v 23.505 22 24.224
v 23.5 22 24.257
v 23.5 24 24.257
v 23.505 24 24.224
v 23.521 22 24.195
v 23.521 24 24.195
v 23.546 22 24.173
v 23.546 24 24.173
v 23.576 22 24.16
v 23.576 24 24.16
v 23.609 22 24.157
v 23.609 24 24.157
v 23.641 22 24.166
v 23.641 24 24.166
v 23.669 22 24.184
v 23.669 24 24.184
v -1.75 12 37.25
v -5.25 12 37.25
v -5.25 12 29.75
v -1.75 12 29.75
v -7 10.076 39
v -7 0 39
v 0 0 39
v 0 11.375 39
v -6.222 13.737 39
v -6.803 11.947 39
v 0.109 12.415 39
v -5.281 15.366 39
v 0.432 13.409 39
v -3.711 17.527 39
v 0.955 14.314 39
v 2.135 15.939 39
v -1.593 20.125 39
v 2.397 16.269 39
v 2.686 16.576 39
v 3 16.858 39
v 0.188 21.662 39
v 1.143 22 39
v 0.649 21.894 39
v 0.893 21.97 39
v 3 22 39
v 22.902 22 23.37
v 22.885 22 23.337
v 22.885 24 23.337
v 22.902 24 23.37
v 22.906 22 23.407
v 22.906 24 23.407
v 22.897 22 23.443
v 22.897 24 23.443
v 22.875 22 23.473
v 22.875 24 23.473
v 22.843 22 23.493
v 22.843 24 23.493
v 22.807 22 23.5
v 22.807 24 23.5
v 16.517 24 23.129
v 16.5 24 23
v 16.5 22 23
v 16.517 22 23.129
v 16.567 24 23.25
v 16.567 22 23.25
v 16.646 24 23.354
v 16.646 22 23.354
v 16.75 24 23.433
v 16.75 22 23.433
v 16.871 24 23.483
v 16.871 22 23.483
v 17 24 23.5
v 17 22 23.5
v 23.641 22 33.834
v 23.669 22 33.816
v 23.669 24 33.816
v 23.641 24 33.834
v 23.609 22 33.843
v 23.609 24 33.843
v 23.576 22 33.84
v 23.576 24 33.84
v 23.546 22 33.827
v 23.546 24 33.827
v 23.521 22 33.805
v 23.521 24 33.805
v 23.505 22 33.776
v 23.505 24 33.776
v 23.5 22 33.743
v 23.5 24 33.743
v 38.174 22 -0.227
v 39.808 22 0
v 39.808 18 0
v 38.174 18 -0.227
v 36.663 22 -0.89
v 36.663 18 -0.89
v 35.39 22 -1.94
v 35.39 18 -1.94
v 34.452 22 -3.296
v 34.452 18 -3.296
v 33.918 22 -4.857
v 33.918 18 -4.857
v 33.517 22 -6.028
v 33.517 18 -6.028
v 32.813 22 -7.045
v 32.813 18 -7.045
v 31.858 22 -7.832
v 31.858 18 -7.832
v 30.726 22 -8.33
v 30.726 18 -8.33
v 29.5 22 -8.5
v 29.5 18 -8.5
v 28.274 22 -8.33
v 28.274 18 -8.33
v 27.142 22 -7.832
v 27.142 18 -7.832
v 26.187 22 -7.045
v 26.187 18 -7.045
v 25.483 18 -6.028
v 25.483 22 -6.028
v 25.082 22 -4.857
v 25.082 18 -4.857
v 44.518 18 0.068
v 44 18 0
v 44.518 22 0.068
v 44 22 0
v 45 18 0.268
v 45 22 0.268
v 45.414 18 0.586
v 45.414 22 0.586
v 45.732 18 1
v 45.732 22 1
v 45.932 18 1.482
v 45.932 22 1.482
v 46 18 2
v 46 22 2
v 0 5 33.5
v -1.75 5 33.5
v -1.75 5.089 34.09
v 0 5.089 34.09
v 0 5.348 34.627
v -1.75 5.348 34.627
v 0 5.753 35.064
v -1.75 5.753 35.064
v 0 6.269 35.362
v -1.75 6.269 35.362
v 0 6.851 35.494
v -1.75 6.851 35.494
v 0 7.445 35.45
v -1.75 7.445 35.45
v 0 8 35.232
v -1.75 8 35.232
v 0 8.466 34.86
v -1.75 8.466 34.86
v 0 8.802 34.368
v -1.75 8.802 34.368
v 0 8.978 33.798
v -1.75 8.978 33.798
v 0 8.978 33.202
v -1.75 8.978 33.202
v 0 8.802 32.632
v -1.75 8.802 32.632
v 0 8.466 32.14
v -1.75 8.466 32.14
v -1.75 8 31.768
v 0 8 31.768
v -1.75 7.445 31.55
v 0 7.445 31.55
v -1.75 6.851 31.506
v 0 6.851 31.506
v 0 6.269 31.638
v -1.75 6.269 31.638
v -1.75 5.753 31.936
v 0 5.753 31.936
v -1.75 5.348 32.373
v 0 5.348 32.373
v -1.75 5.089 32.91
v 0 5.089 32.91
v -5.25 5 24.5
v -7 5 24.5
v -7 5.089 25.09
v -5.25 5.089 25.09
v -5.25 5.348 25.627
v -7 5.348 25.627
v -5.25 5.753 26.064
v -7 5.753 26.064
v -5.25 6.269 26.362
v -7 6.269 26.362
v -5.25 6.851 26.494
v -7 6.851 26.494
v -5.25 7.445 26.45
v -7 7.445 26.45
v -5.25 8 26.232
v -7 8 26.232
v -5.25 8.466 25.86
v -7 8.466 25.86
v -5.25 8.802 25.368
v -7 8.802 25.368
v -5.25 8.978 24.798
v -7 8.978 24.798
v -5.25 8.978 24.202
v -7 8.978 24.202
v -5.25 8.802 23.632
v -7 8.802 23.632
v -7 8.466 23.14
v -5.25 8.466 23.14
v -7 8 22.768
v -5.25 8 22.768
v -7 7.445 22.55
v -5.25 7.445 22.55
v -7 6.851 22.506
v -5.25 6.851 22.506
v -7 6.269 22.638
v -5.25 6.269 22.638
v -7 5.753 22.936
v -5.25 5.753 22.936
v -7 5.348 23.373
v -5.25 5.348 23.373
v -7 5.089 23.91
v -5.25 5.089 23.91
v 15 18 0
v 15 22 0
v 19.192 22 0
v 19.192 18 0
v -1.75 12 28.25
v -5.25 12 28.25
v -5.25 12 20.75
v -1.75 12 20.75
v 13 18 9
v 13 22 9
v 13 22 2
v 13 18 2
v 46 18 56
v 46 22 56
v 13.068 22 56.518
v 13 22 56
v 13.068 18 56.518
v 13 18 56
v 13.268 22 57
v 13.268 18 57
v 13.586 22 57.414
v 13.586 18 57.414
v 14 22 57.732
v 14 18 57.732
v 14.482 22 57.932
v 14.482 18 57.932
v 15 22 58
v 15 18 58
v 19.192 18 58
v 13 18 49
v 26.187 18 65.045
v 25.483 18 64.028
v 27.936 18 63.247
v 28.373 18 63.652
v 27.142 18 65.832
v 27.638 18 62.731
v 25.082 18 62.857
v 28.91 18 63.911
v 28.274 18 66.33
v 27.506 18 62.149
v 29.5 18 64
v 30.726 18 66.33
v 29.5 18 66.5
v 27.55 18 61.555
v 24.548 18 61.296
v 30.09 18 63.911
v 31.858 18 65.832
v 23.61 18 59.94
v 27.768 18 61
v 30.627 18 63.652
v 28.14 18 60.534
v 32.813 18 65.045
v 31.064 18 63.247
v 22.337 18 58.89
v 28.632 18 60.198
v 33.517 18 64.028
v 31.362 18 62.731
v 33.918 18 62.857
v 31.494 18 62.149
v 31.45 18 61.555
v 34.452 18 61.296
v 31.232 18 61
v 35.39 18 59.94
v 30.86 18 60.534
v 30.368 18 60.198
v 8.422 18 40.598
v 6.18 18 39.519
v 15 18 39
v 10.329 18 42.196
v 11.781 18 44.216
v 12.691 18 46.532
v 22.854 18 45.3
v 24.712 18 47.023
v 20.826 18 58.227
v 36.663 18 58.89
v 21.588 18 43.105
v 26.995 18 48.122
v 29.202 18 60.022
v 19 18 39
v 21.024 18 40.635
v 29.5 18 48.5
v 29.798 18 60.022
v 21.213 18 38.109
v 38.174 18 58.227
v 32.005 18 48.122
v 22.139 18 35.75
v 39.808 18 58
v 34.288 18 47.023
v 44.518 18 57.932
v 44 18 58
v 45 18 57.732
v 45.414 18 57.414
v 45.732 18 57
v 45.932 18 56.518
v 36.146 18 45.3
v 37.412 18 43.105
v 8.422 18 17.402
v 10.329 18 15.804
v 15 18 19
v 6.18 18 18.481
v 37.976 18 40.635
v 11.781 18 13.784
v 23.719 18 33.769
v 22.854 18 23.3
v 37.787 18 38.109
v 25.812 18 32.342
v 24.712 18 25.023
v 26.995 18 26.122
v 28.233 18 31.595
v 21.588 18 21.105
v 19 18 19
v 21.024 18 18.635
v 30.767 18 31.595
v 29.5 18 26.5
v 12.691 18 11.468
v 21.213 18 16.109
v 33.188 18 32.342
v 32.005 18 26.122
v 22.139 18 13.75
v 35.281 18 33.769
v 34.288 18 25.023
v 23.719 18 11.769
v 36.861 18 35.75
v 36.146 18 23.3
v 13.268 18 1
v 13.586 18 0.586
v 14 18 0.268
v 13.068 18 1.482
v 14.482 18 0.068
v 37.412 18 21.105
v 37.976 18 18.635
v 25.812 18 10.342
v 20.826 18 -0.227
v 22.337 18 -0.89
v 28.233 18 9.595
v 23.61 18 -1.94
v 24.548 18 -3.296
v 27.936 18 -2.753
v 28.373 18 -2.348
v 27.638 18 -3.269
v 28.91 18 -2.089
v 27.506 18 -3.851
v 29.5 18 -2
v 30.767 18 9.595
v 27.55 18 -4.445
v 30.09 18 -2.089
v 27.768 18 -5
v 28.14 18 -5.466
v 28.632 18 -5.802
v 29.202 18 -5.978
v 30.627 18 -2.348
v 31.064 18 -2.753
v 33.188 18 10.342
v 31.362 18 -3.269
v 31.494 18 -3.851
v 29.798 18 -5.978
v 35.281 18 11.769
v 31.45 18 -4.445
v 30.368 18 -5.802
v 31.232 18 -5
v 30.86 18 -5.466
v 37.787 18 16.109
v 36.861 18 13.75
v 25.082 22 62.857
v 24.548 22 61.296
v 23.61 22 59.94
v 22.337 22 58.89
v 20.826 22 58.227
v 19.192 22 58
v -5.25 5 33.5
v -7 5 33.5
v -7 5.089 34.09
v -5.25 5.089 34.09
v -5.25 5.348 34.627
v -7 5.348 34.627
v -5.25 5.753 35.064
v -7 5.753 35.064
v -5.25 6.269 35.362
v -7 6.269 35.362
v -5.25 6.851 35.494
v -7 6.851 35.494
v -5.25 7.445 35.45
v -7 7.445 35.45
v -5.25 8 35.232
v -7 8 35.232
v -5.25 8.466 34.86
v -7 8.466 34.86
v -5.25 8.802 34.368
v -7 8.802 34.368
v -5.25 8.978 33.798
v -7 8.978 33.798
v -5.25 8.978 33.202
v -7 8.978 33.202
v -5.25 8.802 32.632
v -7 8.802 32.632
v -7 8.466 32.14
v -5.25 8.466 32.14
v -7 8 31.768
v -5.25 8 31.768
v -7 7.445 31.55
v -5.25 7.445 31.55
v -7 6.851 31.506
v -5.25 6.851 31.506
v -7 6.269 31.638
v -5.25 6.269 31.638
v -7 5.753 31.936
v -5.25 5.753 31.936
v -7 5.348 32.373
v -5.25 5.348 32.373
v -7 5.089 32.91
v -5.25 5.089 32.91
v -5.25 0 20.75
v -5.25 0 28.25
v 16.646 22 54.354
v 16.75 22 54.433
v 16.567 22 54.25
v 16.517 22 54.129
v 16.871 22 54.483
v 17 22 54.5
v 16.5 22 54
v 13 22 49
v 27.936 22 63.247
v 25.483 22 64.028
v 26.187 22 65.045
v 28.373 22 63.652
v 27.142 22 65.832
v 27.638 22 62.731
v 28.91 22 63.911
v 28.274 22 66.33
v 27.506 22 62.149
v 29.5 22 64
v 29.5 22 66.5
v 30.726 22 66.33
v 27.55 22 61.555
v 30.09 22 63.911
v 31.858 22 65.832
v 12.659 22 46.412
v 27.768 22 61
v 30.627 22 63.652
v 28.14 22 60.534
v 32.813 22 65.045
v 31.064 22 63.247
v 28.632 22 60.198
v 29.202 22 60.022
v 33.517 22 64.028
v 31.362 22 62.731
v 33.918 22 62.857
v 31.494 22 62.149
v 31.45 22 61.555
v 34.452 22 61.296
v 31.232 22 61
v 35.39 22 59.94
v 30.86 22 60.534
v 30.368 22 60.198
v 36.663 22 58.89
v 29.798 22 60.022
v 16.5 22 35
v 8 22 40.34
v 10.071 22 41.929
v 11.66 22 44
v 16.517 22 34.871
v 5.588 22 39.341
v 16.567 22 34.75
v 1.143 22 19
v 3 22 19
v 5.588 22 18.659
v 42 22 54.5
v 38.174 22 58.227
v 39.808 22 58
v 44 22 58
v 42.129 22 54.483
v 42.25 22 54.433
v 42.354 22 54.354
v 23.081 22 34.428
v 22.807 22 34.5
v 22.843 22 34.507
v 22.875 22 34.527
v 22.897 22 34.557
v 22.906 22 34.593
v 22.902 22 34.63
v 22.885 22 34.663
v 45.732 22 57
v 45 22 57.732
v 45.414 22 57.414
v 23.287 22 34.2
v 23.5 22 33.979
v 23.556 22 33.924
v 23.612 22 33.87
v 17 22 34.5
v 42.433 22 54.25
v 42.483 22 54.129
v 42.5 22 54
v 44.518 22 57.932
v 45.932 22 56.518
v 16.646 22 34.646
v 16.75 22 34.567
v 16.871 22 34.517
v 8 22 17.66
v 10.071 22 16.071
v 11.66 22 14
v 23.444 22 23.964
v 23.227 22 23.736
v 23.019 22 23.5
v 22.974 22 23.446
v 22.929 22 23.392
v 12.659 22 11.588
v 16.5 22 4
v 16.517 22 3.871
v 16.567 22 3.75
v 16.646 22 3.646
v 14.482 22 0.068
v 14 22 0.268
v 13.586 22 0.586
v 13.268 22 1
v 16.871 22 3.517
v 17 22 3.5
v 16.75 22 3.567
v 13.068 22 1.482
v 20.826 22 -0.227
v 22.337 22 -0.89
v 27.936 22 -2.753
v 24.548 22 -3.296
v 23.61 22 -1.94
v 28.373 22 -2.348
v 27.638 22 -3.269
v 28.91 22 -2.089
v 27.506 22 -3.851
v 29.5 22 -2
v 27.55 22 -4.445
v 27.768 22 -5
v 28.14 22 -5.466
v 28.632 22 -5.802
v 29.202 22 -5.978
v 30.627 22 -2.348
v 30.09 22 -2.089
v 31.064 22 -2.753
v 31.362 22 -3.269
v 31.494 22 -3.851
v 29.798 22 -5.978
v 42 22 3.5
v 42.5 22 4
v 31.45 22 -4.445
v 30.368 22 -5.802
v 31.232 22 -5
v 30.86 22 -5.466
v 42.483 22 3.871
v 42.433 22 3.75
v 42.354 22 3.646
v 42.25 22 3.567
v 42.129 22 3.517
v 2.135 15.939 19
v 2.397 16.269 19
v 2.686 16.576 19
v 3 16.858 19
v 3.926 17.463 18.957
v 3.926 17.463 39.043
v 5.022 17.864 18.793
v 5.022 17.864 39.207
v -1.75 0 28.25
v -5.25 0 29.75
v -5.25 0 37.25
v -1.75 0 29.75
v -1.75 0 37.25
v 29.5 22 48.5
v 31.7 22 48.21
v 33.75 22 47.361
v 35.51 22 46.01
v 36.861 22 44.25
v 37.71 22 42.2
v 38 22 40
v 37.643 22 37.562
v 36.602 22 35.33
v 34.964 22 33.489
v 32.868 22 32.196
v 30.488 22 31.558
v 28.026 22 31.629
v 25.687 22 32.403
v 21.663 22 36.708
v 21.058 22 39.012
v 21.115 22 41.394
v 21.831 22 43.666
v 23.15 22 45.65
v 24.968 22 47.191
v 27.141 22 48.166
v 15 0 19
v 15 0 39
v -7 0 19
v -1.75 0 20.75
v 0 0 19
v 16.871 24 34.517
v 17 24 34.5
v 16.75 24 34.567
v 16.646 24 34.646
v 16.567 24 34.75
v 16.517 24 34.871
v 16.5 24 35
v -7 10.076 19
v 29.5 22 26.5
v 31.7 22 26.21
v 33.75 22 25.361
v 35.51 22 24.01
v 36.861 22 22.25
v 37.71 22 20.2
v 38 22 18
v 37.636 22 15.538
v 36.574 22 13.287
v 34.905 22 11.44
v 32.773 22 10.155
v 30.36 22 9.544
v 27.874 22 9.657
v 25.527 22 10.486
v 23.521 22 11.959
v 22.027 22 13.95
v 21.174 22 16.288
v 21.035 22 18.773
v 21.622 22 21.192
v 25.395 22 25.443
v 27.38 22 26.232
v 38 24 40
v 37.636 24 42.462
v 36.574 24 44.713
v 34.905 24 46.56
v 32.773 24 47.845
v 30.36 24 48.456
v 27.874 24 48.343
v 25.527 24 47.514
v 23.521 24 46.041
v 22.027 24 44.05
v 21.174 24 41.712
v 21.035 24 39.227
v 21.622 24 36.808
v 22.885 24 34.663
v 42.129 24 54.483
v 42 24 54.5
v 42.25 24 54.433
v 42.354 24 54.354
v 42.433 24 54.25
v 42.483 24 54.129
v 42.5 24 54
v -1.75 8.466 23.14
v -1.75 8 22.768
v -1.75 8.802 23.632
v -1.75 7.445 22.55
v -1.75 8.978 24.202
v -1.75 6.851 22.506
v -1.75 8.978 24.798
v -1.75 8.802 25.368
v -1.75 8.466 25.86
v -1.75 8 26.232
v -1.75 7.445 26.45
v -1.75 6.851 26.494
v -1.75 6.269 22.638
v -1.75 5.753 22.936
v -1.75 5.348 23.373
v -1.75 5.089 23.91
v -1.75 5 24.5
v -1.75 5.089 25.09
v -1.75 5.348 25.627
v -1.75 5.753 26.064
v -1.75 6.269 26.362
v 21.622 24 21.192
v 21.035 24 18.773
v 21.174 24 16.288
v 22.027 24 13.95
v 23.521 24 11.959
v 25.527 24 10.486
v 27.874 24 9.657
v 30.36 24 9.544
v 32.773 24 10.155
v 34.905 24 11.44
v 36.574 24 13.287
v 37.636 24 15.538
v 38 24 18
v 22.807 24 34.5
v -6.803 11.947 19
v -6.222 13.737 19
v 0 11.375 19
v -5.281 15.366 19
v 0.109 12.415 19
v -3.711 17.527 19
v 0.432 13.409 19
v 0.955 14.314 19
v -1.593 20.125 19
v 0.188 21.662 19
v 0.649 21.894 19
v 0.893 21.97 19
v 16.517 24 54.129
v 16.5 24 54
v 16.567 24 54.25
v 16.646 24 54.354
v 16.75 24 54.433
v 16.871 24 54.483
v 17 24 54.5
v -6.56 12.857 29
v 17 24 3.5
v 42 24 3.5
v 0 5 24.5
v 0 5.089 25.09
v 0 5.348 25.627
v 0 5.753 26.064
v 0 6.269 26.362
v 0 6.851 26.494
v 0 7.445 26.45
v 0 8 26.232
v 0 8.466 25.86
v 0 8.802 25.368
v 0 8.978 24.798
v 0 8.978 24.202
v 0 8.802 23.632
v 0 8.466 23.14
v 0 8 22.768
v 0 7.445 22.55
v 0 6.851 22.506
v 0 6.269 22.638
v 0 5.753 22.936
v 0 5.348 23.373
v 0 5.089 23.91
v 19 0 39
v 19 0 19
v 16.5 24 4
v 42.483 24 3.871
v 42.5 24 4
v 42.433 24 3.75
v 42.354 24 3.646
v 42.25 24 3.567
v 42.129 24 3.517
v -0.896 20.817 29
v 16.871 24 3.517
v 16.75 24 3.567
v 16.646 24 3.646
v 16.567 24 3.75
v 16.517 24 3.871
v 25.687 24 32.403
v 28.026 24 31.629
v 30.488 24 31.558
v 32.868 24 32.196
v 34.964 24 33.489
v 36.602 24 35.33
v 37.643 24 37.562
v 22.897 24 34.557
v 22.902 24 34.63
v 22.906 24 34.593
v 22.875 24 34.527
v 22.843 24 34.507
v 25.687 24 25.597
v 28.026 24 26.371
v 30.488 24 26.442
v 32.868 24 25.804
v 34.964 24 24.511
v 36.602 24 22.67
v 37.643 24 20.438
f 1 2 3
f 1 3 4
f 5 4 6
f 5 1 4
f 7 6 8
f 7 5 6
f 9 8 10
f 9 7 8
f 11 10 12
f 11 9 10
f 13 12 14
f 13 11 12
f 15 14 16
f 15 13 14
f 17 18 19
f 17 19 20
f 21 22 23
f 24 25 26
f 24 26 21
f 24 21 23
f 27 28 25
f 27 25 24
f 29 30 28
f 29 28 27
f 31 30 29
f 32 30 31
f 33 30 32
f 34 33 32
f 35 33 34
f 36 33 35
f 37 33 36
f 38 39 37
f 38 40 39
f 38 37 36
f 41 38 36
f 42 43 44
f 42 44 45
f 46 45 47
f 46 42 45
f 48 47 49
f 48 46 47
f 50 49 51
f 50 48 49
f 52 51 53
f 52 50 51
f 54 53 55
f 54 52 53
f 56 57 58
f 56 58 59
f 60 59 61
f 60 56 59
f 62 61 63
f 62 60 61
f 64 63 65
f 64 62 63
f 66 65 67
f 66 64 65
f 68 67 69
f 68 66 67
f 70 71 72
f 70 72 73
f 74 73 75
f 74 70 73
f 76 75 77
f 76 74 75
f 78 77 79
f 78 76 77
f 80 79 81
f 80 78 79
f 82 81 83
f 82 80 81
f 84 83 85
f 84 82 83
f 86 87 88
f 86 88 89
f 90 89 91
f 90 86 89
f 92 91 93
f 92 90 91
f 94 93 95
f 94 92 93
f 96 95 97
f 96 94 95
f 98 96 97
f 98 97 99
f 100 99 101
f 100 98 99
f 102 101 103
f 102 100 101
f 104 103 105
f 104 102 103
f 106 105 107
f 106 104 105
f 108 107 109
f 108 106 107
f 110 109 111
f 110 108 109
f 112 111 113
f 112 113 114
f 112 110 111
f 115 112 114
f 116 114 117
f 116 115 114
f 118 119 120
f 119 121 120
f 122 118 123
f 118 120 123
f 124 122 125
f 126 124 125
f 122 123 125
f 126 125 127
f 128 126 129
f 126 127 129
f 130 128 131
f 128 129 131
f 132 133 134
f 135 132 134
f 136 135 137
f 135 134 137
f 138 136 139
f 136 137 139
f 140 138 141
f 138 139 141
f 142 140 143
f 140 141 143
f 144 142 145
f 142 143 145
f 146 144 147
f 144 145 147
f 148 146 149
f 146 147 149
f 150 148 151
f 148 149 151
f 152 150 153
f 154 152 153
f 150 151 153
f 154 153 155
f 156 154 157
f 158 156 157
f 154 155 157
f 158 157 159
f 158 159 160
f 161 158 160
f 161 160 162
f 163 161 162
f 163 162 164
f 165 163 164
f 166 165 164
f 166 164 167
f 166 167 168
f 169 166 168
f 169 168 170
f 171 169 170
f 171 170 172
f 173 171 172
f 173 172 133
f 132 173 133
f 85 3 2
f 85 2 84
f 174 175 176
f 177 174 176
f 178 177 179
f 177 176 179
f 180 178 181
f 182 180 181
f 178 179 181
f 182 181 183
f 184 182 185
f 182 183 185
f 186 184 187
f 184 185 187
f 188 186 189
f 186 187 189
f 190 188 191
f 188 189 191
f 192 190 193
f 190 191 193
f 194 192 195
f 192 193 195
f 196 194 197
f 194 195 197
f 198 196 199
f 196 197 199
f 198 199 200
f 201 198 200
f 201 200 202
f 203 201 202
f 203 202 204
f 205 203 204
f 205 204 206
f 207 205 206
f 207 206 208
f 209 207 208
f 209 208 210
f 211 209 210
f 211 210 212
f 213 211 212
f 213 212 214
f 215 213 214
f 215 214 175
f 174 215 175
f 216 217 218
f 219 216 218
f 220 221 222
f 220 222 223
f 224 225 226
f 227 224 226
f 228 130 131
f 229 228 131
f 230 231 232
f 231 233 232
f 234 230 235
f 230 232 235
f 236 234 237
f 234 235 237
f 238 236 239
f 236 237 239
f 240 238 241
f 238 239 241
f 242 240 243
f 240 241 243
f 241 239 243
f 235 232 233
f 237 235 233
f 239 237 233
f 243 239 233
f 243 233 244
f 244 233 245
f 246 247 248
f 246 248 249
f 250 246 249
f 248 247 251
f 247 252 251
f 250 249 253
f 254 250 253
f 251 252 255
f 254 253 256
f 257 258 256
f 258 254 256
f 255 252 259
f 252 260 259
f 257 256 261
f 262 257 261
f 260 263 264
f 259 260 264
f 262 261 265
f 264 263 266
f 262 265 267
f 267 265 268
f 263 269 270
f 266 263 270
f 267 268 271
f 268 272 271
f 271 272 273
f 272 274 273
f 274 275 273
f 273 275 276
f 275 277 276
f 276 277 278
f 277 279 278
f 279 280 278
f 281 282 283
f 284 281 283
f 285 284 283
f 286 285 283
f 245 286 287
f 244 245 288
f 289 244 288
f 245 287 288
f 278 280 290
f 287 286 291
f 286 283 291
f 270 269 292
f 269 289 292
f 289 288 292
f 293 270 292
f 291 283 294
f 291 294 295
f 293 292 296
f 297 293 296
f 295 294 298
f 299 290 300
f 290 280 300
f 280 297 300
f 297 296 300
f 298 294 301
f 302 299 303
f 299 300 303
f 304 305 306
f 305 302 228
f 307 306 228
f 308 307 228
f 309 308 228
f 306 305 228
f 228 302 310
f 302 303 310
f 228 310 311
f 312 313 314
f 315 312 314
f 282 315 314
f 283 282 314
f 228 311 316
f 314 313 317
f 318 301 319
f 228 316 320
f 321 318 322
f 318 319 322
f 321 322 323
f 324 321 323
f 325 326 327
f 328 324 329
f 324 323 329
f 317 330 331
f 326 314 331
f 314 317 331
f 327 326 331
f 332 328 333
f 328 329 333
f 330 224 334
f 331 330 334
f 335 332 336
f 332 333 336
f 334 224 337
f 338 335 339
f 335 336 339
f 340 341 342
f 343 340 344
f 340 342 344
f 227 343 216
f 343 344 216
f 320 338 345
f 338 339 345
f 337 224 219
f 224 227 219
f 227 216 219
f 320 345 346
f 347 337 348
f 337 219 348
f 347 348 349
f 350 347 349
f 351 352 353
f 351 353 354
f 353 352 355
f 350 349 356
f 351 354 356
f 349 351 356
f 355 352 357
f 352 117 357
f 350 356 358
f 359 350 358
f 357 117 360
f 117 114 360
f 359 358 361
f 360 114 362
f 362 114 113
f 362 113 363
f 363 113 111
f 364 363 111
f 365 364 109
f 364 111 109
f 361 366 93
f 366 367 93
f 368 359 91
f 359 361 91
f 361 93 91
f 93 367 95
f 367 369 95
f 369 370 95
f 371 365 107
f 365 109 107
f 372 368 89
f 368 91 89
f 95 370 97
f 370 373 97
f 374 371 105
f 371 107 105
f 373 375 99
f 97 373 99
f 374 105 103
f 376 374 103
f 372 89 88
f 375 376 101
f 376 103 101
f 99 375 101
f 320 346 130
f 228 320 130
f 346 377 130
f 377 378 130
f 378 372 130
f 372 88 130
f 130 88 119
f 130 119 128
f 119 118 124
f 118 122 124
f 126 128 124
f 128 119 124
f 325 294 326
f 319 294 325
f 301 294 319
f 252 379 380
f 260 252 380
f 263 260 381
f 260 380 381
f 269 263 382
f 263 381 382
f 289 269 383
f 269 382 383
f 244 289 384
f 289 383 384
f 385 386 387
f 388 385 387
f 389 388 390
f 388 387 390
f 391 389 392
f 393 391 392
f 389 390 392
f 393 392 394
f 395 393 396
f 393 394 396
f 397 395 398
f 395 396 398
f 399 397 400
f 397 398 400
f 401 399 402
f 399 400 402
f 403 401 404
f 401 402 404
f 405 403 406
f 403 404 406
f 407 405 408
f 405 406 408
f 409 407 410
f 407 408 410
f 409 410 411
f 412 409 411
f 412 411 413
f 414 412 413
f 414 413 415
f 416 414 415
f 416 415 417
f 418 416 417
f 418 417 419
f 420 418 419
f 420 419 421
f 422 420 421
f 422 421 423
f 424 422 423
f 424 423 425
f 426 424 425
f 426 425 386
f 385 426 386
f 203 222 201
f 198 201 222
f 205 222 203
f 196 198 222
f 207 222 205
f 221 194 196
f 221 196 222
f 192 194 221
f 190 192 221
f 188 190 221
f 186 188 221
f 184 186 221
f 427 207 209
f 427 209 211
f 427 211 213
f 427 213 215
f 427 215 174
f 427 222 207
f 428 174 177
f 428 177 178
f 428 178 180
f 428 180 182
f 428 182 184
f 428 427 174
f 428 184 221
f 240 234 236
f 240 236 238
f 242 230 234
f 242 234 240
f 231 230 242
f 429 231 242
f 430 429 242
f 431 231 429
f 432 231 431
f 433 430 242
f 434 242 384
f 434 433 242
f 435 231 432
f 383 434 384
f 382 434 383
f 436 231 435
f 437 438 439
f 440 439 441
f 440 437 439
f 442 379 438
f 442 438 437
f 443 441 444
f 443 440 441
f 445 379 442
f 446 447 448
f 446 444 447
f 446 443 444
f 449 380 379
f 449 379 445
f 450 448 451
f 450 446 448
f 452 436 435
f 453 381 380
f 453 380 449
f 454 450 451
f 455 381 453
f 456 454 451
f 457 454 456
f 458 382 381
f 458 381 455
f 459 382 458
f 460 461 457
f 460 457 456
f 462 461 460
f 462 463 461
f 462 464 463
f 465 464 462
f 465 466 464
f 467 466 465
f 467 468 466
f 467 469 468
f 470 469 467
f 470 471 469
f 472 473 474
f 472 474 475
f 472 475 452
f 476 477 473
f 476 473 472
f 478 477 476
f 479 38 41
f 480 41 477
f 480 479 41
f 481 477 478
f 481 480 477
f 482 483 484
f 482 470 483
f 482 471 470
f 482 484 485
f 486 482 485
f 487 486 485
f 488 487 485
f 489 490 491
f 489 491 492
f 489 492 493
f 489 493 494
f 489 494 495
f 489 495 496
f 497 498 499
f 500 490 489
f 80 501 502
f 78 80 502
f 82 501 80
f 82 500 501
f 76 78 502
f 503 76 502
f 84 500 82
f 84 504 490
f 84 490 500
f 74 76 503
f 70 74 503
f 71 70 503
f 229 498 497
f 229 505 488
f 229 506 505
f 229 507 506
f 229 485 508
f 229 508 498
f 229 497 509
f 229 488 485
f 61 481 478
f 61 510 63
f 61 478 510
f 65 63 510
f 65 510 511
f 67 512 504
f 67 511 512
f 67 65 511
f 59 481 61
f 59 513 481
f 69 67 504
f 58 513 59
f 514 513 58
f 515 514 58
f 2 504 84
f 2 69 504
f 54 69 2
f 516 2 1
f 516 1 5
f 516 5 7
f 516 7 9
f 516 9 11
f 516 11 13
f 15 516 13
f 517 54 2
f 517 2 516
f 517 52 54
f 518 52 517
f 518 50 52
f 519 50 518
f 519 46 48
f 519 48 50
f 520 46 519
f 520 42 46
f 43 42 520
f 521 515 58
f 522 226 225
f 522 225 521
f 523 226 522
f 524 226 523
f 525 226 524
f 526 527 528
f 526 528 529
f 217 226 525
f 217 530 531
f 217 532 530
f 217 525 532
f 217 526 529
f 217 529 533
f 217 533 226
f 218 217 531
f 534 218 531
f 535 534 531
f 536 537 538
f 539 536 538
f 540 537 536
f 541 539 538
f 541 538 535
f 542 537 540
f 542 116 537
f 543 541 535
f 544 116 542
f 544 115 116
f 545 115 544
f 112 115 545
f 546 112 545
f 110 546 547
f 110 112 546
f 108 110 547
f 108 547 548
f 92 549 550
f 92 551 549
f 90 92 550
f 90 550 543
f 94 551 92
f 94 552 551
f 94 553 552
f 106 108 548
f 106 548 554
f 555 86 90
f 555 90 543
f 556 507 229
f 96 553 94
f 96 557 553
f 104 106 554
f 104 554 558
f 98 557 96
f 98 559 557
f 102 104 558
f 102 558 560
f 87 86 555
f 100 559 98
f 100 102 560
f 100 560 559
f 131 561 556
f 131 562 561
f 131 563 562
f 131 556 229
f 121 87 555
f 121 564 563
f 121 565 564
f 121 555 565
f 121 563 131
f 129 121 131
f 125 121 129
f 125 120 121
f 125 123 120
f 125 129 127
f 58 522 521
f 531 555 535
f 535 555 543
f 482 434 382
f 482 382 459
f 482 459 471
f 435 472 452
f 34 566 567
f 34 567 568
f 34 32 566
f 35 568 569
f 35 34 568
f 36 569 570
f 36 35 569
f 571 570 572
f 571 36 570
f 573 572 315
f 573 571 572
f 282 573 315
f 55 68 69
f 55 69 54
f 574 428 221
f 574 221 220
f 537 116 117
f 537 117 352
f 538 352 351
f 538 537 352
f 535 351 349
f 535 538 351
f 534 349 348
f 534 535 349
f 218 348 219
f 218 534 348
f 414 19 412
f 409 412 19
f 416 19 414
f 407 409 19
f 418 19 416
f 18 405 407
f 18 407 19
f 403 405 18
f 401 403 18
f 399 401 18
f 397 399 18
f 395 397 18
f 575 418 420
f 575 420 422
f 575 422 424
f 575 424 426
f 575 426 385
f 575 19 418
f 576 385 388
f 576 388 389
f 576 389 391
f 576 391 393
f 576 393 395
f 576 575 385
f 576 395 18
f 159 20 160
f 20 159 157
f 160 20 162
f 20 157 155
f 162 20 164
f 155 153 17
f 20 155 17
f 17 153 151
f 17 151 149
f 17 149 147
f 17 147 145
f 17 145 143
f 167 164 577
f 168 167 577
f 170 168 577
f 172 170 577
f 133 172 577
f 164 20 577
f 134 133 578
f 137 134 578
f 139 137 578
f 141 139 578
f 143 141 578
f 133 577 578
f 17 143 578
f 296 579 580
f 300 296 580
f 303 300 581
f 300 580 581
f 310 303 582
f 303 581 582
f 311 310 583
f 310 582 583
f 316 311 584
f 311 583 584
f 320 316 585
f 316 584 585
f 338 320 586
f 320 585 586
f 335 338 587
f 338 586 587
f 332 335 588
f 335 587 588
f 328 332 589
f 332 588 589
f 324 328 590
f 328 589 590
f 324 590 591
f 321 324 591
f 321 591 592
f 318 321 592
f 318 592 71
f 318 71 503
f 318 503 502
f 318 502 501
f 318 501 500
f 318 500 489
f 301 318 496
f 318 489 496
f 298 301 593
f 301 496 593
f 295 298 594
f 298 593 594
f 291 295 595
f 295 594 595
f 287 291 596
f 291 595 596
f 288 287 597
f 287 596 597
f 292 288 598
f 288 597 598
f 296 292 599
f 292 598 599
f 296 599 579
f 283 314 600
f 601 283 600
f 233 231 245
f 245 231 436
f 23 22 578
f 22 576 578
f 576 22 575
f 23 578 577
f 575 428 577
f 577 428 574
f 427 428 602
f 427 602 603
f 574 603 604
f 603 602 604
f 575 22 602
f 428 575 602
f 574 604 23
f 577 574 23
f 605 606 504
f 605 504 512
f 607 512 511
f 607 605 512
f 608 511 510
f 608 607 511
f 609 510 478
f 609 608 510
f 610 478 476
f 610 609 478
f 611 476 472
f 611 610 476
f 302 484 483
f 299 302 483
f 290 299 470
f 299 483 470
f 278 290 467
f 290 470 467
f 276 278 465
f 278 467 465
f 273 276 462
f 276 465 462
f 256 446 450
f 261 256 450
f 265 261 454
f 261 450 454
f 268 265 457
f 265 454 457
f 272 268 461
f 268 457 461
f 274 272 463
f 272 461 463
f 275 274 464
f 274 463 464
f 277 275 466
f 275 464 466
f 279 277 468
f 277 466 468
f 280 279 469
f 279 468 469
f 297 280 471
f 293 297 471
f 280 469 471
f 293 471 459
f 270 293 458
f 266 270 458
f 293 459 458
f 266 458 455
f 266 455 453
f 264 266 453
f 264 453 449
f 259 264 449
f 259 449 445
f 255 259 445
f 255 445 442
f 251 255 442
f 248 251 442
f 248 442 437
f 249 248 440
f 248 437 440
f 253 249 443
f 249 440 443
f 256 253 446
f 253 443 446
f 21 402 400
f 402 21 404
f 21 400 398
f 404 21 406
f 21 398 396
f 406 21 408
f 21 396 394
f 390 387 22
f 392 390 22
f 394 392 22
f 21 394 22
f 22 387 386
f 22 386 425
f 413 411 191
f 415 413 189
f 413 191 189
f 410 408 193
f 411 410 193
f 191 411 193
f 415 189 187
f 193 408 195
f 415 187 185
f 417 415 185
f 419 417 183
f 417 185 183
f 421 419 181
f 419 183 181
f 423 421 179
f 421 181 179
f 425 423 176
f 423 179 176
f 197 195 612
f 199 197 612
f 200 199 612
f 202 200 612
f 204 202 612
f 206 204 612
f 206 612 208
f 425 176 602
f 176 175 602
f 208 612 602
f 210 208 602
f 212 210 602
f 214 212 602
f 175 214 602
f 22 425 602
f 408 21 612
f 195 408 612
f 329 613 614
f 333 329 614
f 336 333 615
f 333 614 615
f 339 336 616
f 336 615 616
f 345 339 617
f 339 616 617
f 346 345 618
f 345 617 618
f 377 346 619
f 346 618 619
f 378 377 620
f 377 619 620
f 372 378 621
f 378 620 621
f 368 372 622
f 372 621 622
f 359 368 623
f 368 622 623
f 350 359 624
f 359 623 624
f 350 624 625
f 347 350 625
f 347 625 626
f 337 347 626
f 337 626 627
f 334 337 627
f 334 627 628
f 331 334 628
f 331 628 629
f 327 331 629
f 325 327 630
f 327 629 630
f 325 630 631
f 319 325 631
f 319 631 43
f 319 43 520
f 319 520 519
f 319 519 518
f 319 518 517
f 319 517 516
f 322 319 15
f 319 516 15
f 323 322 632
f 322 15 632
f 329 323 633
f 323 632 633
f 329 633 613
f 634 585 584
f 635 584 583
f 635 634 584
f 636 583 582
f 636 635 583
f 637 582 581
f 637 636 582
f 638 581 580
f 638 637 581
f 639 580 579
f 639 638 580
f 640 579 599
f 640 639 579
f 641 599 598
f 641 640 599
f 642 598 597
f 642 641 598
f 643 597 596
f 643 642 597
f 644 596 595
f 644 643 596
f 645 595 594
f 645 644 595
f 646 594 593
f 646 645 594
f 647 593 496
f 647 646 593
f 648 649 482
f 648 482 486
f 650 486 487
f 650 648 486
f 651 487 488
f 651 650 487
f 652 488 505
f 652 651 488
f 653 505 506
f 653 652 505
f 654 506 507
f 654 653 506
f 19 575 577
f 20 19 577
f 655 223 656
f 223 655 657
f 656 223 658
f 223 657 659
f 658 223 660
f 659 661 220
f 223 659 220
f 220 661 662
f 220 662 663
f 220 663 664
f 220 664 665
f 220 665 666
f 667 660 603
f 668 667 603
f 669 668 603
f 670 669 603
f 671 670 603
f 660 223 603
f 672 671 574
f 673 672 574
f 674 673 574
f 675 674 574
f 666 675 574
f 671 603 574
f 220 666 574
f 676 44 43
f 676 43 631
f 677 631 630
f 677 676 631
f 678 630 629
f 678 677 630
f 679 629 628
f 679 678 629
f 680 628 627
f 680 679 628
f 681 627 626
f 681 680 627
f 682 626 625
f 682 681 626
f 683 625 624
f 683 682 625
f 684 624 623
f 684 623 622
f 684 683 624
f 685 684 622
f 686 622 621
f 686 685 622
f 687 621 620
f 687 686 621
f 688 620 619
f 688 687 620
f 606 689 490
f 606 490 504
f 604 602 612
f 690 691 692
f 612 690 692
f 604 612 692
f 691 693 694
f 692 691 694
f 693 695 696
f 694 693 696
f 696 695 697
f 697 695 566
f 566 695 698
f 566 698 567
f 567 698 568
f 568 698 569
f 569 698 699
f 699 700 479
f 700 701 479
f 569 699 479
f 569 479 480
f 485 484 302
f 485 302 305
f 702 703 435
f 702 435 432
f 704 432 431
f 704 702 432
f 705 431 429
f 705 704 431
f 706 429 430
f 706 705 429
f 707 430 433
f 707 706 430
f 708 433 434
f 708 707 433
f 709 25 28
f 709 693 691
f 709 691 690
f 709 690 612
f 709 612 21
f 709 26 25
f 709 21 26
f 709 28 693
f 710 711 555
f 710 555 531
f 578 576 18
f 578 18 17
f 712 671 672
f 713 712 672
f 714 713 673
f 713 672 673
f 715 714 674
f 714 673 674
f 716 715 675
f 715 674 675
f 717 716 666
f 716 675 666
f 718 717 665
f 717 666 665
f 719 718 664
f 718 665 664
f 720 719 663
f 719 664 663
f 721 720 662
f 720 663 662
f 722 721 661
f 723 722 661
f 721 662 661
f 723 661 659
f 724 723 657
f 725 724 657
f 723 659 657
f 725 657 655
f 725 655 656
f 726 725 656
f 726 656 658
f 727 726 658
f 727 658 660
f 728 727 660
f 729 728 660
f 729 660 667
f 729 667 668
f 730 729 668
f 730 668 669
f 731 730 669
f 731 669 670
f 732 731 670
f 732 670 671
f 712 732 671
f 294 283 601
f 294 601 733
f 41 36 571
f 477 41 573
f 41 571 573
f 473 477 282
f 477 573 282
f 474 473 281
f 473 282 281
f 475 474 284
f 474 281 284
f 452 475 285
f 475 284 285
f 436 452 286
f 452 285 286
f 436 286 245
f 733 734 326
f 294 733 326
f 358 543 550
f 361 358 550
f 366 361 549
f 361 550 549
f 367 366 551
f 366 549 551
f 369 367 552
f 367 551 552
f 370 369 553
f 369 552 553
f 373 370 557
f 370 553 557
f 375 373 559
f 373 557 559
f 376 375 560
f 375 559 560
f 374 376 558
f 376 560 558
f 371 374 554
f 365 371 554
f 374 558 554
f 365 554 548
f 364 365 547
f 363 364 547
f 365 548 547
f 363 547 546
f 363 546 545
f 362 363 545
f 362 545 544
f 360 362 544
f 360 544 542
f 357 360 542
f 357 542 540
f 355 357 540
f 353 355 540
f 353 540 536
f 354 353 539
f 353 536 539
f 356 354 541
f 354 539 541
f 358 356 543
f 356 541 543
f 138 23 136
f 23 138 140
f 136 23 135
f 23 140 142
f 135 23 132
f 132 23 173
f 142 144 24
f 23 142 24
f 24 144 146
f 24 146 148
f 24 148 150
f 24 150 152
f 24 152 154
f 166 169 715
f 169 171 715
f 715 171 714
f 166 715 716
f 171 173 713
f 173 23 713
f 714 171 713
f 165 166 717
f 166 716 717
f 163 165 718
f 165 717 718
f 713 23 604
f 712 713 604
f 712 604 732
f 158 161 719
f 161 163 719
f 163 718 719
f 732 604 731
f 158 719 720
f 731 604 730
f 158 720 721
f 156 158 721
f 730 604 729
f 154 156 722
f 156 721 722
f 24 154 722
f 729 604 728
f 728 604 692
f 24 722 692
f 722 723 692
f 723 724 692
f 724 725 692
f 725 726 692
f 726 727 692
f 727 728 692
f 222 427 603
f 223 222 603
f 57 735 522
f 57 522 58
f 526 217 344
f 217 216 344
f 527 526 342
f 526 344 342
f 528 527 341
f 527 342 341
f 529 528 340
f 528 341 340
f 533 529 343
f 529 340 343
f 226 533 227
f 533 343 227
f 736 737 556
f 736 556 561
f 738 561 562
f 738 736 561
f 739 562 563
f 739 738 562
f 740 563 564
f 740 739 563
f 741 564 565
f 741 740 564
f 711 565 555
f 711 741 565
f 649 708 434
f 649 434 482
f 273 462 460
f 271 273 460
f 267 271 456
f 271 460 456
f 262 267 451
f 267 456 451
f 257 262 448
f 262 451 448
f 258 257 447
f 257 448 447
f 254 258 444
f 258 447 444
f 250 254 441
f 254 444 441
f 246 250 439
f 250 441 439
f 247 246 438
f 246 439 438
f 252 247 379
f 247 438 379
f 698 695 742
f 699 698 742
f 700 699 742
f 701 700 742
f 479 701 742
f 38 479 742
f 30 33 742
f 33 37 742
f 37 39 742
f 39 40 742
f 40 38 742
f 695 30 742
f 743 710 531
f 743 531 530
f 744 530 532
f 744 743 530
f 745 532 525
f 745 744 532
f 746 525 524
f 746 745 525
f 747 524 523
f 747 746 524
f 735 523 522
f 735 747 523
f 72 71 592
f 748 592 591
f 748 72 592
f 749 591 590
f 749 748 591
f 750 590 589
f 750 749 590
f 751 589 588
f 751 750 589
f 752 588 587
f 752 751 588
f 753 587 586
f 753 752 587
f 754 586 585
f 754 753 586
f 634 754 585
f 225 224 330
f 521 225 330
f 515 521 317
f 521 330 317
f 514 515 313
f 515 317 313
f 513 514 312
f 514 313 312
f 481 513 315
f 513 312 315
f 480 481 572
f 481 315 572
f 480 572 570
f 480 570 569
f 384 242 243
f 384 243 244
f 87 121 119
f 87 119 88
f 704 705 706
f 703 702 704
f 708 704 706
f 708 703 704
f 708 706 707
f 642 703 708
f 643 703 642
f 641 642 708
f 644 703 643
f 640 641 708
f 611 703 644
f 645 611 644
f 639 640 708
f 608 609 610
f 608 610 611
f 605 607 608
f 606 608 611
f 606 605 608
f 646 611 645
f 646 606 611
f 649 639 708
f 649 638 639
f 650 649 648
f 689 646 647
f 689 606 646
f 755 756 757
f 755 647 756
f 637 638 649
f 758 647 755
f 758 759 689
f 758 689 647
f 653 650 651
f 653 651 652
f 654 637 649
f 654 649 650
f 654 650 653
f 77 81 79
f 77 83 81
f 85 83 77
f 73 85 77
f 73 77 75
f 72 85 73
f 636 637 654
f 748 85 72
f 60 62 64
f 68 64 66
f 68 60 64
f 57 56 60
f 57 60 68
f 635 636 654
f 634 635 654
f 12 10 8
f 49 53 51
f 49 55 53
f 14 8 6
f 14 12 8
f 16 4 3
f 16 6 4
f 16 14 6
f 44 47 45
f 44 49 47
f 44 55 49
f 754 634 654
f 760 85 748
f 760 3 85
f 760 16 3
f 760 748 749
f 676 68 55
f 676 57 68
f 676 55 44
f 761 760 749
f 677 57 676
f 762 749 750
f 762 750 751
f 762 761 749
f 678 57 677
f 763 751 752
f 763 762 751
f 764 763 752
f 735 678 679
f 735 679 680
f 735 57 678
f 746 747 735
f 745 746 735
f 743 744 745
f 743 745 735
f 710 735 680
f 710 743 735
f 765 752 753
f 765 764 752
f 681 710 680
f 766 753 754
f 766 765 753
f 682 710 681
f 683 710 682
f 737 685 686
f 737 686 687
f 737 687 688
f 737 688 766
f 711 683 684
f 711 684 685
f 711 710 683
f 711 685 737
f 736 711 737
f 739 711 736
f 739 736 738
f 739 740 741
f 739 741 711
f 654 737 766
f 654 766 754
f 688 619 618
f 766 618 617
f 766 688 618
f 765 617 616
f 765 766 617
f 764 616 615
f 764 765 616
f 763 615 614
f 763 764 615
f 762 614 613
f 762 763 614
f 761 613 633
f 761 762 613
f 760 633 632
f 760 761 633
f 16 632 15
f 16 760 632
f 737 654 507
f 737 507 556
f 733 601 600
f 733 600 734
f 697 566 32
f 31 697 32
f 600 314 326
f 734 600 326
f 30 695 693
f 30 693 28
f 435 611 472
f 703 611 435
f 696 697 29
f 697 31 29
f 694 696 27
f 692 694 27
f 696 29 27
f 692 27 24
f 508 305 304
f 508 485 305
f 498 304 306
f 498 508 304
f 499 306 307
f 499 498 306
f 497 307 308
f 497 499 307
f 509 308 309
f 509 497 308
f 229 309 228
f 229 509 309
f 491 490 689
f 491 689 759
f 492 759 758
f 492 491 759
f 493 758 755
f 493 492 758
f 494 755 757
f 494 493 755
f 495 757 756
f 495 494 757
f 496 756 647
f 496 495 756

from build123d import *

# Parameters (mm, degrees)
BOSS_EXTRU_1_DEPTH      = 58
ESQUISSE16_R            = 2
BOSS_EXTRU_2_DEPTH      = 4
ESQUISSE9_R             = 2
ENL_V_MAT_EXTRU_5_DEPTH = 10
ESQUISSE14_W            = 20
ESQUISSE14_H            = 19
ENL_V_MAT_EXTRU_7_DEPTH = 84.798866341
ESQUISSE5_W             = 3.5
ESQUISSE5_H             = 7.5
ENL_V_MAT_EXTRU_3_DEPTH = 12
CONG_6_R                = 2
CONG_11_R               = 10
ESQUISSE15_W            = 72.69818271
ESQUISSE15_H            = 50
ENL_V_MAT_EXTRU_8_DEPTH = 18
ESQUISSE17_R            = 8.5
ENL_V_MAT_EXTRU_9_DEPTH = 10
CHANFREIN1_SIZE         = 9
CHANFREIN1_SIZE2        = 6.538882752
CHANFREIN2_SIZE         = 5
CHANFREIN2_SIZE2        = 3.63271264
CONG_14_R               = 5
CONG_16_START           = 18
CONG_16_DEPTH           = 22
BOSS_EXTRU_3_START      = 2
BOSS_EXTRU_3_DEPTH      = 2
CONG_17_START           = 22
CONG_17_DEPTH           = 3


with BuildPart() as part:
    # Esquisse1 → Boss.-Extru.1 (new body)
    with BuildSketch(Plane.XY):
        Polygon((0, 0), (0, 18), (15, 18), (15, 0), (19, 0), (19, 18), (46, 18), (46, 22), (-7, 22), (-7, 0), align=None)
    extrude(amount=BOSS_EXTRU_1_DEPTH)

    # Esquisse16 → Boss.-Extru.2 (add)
    # profile 1 of 2: a face of its own
    with BuildSketch(Plane(origin=(0, 22, 0), x_dir=(1, 0, 0), z_dir=(0, 1, 0))):
        with BuildLine():
            Line((17, -3), (42, -3))
            Line((42, -3), (42, 0))
            Line((42, 0), (39.807764064, 0))
            ThreePointArc((39.807764064, 0), (35.990510002, 1.370899501), (33.91761317, 4.857142857))
            ThreePointArc((33.91761317, 4.857142857), (29.5, 8.5), (25.08238683, 4.857142857))
            ThreePointArc((25.08238683, 4.857142857), (23.009489998, 1.370899501), (19.192235936, 0))
            Line((19.192235936, 0), (17, 0))
            Line((17, 0), (17, -3))
        make_face()
        with Locations(Location((29.5, 4, 0), (0, 0, 270))):
            Circle(ESQUISSE16_R, mode=Mode.SUBTRACT)
    # profile 2 of 2: a face of its own
    with BuildSketch(Plane(origin=(0, 22, 0), x_dir=(1, 0, 0), z_dir=(0, 1, 0))):
        with BuildLine():
            Line((17, -58), (17, -55))
            Line((17, -55), (42, -55))
            Line((42, -55), (42, -58))
            Line((42, -58), (39.807764064, -58))
            ThreePointArc((39.807764064, -58), (35.990510002, -59.370899501), (33.91761317, -62.857142857))
            ThreePointArc((33.91761317, -62.857142857), (29.5, -66.5), (25.08238683, -62.857142857))
            ThreePointArc((25.08238683, -62.857142857), (23.009489998, -59.370899501), (19.192235936, -58))
            Line((19.192235936, -58), (17, -58))
        make_face()
        with Locations(Location((29.5, -62, 0), (0, 0, 270))):
            Circle(ESQUISSE16_R, mode=Mode.SUBTRACT)
    extrude(amount=-BOSS_EXTRU_2_DEPTH)

    # Esquisse9 → Enlèv. mat.-Extru.5 (cut)
    with BuildSketch(Plane.ZY.offset(7)):
        with Locations(Location((33.5, 7, 0), (0, 0, 270))):
            Circle(ESQUISSE9_R)
        with Locations(Location((24.5, 7, 0), (0, 0, 270))):
            Circle(ESQUISSE9_R)
    extrude(amount=-ENL_V_MAT_EXTRU_5_DEPTH, mode=Mode.SUBTRACT)

    # Esquisse14 → Enlèv. mat.-Extru.7 (cut, through all)
    with BuildSketch(Plane(origin=(0, 22, 0), x_dir=(1, 0, 0), z_dir=(0, 1, 0))):
        with Locations((3, -9.5)):
            Rectangle(ESQUISSE14_W, ESQUISSE14_H)
        with Locations((3, -48.5)):
            Rectangle(ESQUISSE14_W, ESQUISSE14_H)
    extrude(amount=-ENL_V_MAT_EXTRU_7_DEPTH, mode=Mode.SUBTRACT)

    # Esquisse5 → Enlèv. mat.-Extru.3 (cut)
    with BuildSketch(Plane.XZ):
        with Locations((-3.5, 33.5)):
            Rectangle(ESQUISSE5_W, ESQUISSE5_H)
        with Locations((-3.5, 24.5)):
            Rectangle(ESQUISSE5_W, ESQUISSE5_H)
    extrude(amount=-ENL_V_MAT_EXTRU_3_DEPTH, mode=Mode.SUBTRACT)

    # Congé6
    cong_6_edges = [part.edges().sort_by_distance(p)[0] for p in [
        (46, 20, 0),
        (46, 20, 58),
        (13, 20, 0),
        (13, 20, 58),
    ]]
    fillet(cong_6_edges, radius=CONG_6_R)

    # Congé11
    cong_11_edges = [part.edges().sort_by_distance(p)[0] for p in [
        (13, 20, 19),
        (13, 20, 39),
    ]]
    fillet(cong_11_edges, radius=CONG_11_R)

    # Esquisse15 → Enlèv. mat.-Extru.8 (cut)
    with BuildSketch(Plane.XZ):
        with Locations((29.349091355, -6)):
            Rectangle(ESQUISSE15_W, ESQUISSE15_H)
        with Locations((29.349091355, 64)):
            Rectangle(ESQUISSE15_W, ESQUISSE15_H)
    extrude(amount=-ENL_V_MAT_EXTRU_8_DEPTH, mode=Mode.SUBTRACT)

    # Esquisse17 → Enlèv. mat.-Extru.9 (cut)
    with BuildSketch(Plane(origin=(0, 22, 0), x_dir=(1, 0, 0), z_dir=(0, 1, 0))):
        with Locations(Location((29.5, -18, 0), (0, 0, 270))):
            Circle(ESQUISSE17_R)
        with Locations(Location((29.5, -40, 0), (0, 0, 270))):
            Circle(ESQUISSE17_R)
    extrude(amount=-ENL_V_MAT_EXTRU_9_DEPTH, mode=Mode.SUBTRACT)

    # Chanfrein1
    chanfrein1_edges = [part.edges().sort_by_distance(p)[0] for p in [
        (-7, 22, 29),
    ]]
    chanfrein1_side = [part.faces().sort_by_distance(p)[0] for p in [
        (-7, 11.242320797, 29),
    ]]
    chamfer(chanfrein1_edges, length=CHANFREIN1_SIZE, length2=CHANFREIN1_SIZE2, reference=chanfrein1_side[0])

    # Chanfrein2
    chanfrein2_edges = [part.edges().sort_by_distance(p)[0] for p in [
        (0, 18, 29),
    ]]
    chanfrein2_side = [part.faces().sort_by_distance(p)[0] for p in [
        (0, 9.150105695, 29),
    ]]
    chamfer(chanfrein2_edges, length=CHANFREIN2_SIZE, length2=CHANFREIN2_SIZE2, reference=chanfrein2_side[0])

    # Congé14
    cong_14_edges = [part.edges().sort_by_distance(p)[0] for p in [
        (3.63271264, 18, 29),
        (0, 13, 29),
    ]]
    fillet(cong_14_edges, radius=CONG_14_R)

    # Congé15
    # a fillet whose section is not a circle: 8, 6 mm, written as the material it takes off along each edge
    with BuildSketch(Plane(origin=(-0.461117248, 22, 5.17677837), x_dir=(1, 0, 0), z_dir=(0, 0, 1))) as cong_15_piece_1:
        with BuildLine():
            Bezier((1.604067641, 0), (0, 0), (-3.250034325, -4.473288486), weights=[1, 0.891006524, 1])
            Line((-3.250034325, -4.473288486), (0, 0))
            Line((0, 0), (1.604067641, 0))
        make_face()
    extrude(amount=47.64644326, mode=Mode.SUBTRACT)

    # Congé16: read off the stored shape, not the designer's step
    # Congé16 outline → Congé16 (cut)
    with BuildSketch(Plane.XY.offset(CONG_16_START)):
        with BuildLine():
            Line((-7, 13), (-7, 10.075722734))
            add(Edge.make_bspline(
                [(-7, 10.075722734), (-7, 13), (-5.281152949, 15.365790005)],
                knots=[0, 0, 0, 1, 1, 1], degree=2, weights=[1, 0.951056516, 1]))
            Line((-5.281152949, 15.365790005), (-7, 13))
        make_face()
    extrude(amount=CONG_16_DEPTH, mode=Mode.SUBTRACT)

    # Esquisse19 → Boss.-Extru.3 (add)
    with BuildSketch(Plane(origin=(0, 22, 0), x_dir=(1, 0, 0), z_dir=(0, 1, 0)).offset(BOSS_EXTRU_3_START)):
        with BuildLine():
            ThreePointArc((38, -18), (32.759601203, -25.850159234), (23.5, -24.020797289))
            Line((23.5, -24.020797289), (23.5, -33.979202711))
            ThreePointArc((23.5, -33.979202711), (32.759601203, -32.149840766), (38, -40))
            ThreePointArc((38, -40), (26.570520177, -47.979232292), (23.019259302, -34.5))
            Line((23.019259302, -34.5), (17, -34.5))
            ThreePointArc((17, -34.5), (16.646446609, -34.646446609), (16.5, -35))
            Line((16.5, -35), (16.5, -54))
            ThreePointArc((16.5, -54), (16.646446609, -54.353553391), (17, -54.5))
            Line((17, -54.5), (42, -54.5))
            ThreePointArc((42, -54.5), (42.353553391, -54.353553391), (42.5, -54))
            Line((42.5, -54), (42.5, -4))
            ThreePointArc((42.5, -4), (42.353553391, -3.646446609), (42, -3.5))
            Line((42, -3.5), (17, -3.5))
            ThreePointArc((17, -3.5), (16.646446609, -3.646446609), (16.5, -4))
            Line((16.5, -4), (16.5, -23))
            ThreePointArc((16.5, -23), (16.646446609, -23.353553391), (17, -23.5))
            Line((17, -23.5), (23.019259302, -23.5))
            ThreePointArc((23.019259302, -23.5), (26.570520177, -10.020767708), (38, -18))
        make_face()
    extrude(amount=-BOSS_EXTRU_3_DEPTH)

    # Congé17: read off the stored shape, not the designer's step
    # Congé17 outline → Congé17 (cut)
    with BuildSketch(Plane(origin=(0, 0, 0), x_dir=(1, 0, 0), z_dir=(0, 1, 0)).offset(CONG_17_START)):
        with BuildLine():
            ThreePointArc((23.668604651, -33.815759684), (23.560379709, -33.834820214), (23.5, -33.743003916))
            Line((23.5, -33.743003916), (23.5, -33.979202711))
            ThreePointArc((23.5, -33.979202711), (23.583737888, -33.896898934), (23.668604651, -33.815759684))
        make_face()
        with BuildLine():
            ThreePointArc((22.884548627, -23.337209302), (22.896939159, -23.443133109), (22.806719788, -23.5))
            Line((22.806719788, -23.5), (23.019259302, -23.5))
            ThreePointArc((23.019259302, -23.5), (22.951398096, -23.419023261), (22.884548627, -23.337209302))
        make_face()
        with BuildLine():
            ThreePointArc((23.668604651, -24.184240316), (23.583737888, -24.103101066), (23.5, -24.020797289))
            Line((23.5, -24.020797289), (23.5, -24.256996084))
            ThreePointArc((23.5, -24.256996084), (23.560379709, -24.165179786), (23.668604651, -24.184240316))
        make_face()
        with BuildLine():
            ThreePointArc((22.884548627, -34.662790698), (22.951398096, -34.580976739), (23.019259302, -34.5))
            Line((23.019259302, -34.5), (22.806719788, -34.5))
            ThreePointArc((22.806719788, -34.5), (22.896939159, -34.556866891), (22.884548627, -34.662790698))
        make_face()
    extrude(amount=CONG_17_DEPTH, mode=Mode.SUBTRACT)


solid = part.part
